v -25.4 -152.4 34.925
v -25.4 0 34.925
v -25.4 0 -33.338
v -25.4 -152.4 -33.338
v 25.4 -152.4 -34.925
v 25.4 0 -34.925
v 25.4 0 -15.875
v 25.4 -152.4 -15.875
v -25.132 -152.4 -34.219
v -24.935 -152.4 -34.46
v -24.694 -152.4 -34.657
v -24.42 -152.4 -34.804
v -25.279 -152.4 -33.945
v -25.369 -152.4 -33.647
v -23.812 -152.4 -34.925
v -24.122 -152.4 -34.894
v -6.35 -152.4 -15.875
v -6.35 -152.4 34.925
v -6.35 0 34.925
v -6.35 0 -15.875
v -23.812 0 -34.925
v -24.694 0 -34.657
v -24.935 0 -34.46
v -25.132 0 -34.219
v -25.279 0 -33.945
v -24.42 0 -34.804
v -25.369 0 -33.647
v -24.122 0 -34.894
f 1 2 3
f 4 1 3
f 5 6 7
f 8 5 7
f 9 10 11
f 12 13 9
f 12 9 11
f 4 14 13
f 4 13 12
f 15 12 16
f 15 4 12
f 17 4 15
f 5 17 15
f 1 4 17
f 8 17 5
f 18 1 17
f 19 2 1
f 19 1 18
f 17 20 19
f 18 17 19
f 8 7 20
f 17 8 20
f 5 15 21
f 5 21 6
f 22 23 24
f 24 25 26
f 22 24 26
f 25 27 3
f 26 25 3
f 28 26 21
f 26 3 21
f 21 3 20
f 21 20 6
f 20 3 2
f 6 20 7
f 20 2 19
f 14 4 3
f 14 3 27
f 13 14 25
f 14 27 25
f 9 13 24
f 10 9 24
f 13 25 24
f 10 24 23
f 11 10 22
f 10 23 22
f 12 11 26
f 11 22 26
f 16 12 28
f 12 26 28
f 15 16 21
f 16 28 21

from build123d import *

# Parameters (mm, degrees)
F0_W     = 19.05
F0_H     = 50.8
F1_DEPTH = 152.4


with BuildPart() as f1:
    # F0 (on Front) → F1 (new body)
    with BuildSketch(Plane.XZ):
        with Locations((-15.875, 9.525)):
            Rectangle(F0_W, F0_H)
        with BuildLine():
            ThreePointArc((-25.4, -33.3375), (-24.935032, -34.460032), (-23.8125, -34.925))
            Line((-23.8125, -34.925), (25.4, -34.925))
            Line((25.4, -34.925), (25.4, -15.875))
            Line((25.4, -15.875), (-6.35, -15.875))
            Line((-6.35, -15.875), (-25.4, -15.875))
            Line((-25.4, -15.875), (-25.4, -33.3375))
        make_face()
    extrude(amount=F1_DEPTH)


solid = f1.part
